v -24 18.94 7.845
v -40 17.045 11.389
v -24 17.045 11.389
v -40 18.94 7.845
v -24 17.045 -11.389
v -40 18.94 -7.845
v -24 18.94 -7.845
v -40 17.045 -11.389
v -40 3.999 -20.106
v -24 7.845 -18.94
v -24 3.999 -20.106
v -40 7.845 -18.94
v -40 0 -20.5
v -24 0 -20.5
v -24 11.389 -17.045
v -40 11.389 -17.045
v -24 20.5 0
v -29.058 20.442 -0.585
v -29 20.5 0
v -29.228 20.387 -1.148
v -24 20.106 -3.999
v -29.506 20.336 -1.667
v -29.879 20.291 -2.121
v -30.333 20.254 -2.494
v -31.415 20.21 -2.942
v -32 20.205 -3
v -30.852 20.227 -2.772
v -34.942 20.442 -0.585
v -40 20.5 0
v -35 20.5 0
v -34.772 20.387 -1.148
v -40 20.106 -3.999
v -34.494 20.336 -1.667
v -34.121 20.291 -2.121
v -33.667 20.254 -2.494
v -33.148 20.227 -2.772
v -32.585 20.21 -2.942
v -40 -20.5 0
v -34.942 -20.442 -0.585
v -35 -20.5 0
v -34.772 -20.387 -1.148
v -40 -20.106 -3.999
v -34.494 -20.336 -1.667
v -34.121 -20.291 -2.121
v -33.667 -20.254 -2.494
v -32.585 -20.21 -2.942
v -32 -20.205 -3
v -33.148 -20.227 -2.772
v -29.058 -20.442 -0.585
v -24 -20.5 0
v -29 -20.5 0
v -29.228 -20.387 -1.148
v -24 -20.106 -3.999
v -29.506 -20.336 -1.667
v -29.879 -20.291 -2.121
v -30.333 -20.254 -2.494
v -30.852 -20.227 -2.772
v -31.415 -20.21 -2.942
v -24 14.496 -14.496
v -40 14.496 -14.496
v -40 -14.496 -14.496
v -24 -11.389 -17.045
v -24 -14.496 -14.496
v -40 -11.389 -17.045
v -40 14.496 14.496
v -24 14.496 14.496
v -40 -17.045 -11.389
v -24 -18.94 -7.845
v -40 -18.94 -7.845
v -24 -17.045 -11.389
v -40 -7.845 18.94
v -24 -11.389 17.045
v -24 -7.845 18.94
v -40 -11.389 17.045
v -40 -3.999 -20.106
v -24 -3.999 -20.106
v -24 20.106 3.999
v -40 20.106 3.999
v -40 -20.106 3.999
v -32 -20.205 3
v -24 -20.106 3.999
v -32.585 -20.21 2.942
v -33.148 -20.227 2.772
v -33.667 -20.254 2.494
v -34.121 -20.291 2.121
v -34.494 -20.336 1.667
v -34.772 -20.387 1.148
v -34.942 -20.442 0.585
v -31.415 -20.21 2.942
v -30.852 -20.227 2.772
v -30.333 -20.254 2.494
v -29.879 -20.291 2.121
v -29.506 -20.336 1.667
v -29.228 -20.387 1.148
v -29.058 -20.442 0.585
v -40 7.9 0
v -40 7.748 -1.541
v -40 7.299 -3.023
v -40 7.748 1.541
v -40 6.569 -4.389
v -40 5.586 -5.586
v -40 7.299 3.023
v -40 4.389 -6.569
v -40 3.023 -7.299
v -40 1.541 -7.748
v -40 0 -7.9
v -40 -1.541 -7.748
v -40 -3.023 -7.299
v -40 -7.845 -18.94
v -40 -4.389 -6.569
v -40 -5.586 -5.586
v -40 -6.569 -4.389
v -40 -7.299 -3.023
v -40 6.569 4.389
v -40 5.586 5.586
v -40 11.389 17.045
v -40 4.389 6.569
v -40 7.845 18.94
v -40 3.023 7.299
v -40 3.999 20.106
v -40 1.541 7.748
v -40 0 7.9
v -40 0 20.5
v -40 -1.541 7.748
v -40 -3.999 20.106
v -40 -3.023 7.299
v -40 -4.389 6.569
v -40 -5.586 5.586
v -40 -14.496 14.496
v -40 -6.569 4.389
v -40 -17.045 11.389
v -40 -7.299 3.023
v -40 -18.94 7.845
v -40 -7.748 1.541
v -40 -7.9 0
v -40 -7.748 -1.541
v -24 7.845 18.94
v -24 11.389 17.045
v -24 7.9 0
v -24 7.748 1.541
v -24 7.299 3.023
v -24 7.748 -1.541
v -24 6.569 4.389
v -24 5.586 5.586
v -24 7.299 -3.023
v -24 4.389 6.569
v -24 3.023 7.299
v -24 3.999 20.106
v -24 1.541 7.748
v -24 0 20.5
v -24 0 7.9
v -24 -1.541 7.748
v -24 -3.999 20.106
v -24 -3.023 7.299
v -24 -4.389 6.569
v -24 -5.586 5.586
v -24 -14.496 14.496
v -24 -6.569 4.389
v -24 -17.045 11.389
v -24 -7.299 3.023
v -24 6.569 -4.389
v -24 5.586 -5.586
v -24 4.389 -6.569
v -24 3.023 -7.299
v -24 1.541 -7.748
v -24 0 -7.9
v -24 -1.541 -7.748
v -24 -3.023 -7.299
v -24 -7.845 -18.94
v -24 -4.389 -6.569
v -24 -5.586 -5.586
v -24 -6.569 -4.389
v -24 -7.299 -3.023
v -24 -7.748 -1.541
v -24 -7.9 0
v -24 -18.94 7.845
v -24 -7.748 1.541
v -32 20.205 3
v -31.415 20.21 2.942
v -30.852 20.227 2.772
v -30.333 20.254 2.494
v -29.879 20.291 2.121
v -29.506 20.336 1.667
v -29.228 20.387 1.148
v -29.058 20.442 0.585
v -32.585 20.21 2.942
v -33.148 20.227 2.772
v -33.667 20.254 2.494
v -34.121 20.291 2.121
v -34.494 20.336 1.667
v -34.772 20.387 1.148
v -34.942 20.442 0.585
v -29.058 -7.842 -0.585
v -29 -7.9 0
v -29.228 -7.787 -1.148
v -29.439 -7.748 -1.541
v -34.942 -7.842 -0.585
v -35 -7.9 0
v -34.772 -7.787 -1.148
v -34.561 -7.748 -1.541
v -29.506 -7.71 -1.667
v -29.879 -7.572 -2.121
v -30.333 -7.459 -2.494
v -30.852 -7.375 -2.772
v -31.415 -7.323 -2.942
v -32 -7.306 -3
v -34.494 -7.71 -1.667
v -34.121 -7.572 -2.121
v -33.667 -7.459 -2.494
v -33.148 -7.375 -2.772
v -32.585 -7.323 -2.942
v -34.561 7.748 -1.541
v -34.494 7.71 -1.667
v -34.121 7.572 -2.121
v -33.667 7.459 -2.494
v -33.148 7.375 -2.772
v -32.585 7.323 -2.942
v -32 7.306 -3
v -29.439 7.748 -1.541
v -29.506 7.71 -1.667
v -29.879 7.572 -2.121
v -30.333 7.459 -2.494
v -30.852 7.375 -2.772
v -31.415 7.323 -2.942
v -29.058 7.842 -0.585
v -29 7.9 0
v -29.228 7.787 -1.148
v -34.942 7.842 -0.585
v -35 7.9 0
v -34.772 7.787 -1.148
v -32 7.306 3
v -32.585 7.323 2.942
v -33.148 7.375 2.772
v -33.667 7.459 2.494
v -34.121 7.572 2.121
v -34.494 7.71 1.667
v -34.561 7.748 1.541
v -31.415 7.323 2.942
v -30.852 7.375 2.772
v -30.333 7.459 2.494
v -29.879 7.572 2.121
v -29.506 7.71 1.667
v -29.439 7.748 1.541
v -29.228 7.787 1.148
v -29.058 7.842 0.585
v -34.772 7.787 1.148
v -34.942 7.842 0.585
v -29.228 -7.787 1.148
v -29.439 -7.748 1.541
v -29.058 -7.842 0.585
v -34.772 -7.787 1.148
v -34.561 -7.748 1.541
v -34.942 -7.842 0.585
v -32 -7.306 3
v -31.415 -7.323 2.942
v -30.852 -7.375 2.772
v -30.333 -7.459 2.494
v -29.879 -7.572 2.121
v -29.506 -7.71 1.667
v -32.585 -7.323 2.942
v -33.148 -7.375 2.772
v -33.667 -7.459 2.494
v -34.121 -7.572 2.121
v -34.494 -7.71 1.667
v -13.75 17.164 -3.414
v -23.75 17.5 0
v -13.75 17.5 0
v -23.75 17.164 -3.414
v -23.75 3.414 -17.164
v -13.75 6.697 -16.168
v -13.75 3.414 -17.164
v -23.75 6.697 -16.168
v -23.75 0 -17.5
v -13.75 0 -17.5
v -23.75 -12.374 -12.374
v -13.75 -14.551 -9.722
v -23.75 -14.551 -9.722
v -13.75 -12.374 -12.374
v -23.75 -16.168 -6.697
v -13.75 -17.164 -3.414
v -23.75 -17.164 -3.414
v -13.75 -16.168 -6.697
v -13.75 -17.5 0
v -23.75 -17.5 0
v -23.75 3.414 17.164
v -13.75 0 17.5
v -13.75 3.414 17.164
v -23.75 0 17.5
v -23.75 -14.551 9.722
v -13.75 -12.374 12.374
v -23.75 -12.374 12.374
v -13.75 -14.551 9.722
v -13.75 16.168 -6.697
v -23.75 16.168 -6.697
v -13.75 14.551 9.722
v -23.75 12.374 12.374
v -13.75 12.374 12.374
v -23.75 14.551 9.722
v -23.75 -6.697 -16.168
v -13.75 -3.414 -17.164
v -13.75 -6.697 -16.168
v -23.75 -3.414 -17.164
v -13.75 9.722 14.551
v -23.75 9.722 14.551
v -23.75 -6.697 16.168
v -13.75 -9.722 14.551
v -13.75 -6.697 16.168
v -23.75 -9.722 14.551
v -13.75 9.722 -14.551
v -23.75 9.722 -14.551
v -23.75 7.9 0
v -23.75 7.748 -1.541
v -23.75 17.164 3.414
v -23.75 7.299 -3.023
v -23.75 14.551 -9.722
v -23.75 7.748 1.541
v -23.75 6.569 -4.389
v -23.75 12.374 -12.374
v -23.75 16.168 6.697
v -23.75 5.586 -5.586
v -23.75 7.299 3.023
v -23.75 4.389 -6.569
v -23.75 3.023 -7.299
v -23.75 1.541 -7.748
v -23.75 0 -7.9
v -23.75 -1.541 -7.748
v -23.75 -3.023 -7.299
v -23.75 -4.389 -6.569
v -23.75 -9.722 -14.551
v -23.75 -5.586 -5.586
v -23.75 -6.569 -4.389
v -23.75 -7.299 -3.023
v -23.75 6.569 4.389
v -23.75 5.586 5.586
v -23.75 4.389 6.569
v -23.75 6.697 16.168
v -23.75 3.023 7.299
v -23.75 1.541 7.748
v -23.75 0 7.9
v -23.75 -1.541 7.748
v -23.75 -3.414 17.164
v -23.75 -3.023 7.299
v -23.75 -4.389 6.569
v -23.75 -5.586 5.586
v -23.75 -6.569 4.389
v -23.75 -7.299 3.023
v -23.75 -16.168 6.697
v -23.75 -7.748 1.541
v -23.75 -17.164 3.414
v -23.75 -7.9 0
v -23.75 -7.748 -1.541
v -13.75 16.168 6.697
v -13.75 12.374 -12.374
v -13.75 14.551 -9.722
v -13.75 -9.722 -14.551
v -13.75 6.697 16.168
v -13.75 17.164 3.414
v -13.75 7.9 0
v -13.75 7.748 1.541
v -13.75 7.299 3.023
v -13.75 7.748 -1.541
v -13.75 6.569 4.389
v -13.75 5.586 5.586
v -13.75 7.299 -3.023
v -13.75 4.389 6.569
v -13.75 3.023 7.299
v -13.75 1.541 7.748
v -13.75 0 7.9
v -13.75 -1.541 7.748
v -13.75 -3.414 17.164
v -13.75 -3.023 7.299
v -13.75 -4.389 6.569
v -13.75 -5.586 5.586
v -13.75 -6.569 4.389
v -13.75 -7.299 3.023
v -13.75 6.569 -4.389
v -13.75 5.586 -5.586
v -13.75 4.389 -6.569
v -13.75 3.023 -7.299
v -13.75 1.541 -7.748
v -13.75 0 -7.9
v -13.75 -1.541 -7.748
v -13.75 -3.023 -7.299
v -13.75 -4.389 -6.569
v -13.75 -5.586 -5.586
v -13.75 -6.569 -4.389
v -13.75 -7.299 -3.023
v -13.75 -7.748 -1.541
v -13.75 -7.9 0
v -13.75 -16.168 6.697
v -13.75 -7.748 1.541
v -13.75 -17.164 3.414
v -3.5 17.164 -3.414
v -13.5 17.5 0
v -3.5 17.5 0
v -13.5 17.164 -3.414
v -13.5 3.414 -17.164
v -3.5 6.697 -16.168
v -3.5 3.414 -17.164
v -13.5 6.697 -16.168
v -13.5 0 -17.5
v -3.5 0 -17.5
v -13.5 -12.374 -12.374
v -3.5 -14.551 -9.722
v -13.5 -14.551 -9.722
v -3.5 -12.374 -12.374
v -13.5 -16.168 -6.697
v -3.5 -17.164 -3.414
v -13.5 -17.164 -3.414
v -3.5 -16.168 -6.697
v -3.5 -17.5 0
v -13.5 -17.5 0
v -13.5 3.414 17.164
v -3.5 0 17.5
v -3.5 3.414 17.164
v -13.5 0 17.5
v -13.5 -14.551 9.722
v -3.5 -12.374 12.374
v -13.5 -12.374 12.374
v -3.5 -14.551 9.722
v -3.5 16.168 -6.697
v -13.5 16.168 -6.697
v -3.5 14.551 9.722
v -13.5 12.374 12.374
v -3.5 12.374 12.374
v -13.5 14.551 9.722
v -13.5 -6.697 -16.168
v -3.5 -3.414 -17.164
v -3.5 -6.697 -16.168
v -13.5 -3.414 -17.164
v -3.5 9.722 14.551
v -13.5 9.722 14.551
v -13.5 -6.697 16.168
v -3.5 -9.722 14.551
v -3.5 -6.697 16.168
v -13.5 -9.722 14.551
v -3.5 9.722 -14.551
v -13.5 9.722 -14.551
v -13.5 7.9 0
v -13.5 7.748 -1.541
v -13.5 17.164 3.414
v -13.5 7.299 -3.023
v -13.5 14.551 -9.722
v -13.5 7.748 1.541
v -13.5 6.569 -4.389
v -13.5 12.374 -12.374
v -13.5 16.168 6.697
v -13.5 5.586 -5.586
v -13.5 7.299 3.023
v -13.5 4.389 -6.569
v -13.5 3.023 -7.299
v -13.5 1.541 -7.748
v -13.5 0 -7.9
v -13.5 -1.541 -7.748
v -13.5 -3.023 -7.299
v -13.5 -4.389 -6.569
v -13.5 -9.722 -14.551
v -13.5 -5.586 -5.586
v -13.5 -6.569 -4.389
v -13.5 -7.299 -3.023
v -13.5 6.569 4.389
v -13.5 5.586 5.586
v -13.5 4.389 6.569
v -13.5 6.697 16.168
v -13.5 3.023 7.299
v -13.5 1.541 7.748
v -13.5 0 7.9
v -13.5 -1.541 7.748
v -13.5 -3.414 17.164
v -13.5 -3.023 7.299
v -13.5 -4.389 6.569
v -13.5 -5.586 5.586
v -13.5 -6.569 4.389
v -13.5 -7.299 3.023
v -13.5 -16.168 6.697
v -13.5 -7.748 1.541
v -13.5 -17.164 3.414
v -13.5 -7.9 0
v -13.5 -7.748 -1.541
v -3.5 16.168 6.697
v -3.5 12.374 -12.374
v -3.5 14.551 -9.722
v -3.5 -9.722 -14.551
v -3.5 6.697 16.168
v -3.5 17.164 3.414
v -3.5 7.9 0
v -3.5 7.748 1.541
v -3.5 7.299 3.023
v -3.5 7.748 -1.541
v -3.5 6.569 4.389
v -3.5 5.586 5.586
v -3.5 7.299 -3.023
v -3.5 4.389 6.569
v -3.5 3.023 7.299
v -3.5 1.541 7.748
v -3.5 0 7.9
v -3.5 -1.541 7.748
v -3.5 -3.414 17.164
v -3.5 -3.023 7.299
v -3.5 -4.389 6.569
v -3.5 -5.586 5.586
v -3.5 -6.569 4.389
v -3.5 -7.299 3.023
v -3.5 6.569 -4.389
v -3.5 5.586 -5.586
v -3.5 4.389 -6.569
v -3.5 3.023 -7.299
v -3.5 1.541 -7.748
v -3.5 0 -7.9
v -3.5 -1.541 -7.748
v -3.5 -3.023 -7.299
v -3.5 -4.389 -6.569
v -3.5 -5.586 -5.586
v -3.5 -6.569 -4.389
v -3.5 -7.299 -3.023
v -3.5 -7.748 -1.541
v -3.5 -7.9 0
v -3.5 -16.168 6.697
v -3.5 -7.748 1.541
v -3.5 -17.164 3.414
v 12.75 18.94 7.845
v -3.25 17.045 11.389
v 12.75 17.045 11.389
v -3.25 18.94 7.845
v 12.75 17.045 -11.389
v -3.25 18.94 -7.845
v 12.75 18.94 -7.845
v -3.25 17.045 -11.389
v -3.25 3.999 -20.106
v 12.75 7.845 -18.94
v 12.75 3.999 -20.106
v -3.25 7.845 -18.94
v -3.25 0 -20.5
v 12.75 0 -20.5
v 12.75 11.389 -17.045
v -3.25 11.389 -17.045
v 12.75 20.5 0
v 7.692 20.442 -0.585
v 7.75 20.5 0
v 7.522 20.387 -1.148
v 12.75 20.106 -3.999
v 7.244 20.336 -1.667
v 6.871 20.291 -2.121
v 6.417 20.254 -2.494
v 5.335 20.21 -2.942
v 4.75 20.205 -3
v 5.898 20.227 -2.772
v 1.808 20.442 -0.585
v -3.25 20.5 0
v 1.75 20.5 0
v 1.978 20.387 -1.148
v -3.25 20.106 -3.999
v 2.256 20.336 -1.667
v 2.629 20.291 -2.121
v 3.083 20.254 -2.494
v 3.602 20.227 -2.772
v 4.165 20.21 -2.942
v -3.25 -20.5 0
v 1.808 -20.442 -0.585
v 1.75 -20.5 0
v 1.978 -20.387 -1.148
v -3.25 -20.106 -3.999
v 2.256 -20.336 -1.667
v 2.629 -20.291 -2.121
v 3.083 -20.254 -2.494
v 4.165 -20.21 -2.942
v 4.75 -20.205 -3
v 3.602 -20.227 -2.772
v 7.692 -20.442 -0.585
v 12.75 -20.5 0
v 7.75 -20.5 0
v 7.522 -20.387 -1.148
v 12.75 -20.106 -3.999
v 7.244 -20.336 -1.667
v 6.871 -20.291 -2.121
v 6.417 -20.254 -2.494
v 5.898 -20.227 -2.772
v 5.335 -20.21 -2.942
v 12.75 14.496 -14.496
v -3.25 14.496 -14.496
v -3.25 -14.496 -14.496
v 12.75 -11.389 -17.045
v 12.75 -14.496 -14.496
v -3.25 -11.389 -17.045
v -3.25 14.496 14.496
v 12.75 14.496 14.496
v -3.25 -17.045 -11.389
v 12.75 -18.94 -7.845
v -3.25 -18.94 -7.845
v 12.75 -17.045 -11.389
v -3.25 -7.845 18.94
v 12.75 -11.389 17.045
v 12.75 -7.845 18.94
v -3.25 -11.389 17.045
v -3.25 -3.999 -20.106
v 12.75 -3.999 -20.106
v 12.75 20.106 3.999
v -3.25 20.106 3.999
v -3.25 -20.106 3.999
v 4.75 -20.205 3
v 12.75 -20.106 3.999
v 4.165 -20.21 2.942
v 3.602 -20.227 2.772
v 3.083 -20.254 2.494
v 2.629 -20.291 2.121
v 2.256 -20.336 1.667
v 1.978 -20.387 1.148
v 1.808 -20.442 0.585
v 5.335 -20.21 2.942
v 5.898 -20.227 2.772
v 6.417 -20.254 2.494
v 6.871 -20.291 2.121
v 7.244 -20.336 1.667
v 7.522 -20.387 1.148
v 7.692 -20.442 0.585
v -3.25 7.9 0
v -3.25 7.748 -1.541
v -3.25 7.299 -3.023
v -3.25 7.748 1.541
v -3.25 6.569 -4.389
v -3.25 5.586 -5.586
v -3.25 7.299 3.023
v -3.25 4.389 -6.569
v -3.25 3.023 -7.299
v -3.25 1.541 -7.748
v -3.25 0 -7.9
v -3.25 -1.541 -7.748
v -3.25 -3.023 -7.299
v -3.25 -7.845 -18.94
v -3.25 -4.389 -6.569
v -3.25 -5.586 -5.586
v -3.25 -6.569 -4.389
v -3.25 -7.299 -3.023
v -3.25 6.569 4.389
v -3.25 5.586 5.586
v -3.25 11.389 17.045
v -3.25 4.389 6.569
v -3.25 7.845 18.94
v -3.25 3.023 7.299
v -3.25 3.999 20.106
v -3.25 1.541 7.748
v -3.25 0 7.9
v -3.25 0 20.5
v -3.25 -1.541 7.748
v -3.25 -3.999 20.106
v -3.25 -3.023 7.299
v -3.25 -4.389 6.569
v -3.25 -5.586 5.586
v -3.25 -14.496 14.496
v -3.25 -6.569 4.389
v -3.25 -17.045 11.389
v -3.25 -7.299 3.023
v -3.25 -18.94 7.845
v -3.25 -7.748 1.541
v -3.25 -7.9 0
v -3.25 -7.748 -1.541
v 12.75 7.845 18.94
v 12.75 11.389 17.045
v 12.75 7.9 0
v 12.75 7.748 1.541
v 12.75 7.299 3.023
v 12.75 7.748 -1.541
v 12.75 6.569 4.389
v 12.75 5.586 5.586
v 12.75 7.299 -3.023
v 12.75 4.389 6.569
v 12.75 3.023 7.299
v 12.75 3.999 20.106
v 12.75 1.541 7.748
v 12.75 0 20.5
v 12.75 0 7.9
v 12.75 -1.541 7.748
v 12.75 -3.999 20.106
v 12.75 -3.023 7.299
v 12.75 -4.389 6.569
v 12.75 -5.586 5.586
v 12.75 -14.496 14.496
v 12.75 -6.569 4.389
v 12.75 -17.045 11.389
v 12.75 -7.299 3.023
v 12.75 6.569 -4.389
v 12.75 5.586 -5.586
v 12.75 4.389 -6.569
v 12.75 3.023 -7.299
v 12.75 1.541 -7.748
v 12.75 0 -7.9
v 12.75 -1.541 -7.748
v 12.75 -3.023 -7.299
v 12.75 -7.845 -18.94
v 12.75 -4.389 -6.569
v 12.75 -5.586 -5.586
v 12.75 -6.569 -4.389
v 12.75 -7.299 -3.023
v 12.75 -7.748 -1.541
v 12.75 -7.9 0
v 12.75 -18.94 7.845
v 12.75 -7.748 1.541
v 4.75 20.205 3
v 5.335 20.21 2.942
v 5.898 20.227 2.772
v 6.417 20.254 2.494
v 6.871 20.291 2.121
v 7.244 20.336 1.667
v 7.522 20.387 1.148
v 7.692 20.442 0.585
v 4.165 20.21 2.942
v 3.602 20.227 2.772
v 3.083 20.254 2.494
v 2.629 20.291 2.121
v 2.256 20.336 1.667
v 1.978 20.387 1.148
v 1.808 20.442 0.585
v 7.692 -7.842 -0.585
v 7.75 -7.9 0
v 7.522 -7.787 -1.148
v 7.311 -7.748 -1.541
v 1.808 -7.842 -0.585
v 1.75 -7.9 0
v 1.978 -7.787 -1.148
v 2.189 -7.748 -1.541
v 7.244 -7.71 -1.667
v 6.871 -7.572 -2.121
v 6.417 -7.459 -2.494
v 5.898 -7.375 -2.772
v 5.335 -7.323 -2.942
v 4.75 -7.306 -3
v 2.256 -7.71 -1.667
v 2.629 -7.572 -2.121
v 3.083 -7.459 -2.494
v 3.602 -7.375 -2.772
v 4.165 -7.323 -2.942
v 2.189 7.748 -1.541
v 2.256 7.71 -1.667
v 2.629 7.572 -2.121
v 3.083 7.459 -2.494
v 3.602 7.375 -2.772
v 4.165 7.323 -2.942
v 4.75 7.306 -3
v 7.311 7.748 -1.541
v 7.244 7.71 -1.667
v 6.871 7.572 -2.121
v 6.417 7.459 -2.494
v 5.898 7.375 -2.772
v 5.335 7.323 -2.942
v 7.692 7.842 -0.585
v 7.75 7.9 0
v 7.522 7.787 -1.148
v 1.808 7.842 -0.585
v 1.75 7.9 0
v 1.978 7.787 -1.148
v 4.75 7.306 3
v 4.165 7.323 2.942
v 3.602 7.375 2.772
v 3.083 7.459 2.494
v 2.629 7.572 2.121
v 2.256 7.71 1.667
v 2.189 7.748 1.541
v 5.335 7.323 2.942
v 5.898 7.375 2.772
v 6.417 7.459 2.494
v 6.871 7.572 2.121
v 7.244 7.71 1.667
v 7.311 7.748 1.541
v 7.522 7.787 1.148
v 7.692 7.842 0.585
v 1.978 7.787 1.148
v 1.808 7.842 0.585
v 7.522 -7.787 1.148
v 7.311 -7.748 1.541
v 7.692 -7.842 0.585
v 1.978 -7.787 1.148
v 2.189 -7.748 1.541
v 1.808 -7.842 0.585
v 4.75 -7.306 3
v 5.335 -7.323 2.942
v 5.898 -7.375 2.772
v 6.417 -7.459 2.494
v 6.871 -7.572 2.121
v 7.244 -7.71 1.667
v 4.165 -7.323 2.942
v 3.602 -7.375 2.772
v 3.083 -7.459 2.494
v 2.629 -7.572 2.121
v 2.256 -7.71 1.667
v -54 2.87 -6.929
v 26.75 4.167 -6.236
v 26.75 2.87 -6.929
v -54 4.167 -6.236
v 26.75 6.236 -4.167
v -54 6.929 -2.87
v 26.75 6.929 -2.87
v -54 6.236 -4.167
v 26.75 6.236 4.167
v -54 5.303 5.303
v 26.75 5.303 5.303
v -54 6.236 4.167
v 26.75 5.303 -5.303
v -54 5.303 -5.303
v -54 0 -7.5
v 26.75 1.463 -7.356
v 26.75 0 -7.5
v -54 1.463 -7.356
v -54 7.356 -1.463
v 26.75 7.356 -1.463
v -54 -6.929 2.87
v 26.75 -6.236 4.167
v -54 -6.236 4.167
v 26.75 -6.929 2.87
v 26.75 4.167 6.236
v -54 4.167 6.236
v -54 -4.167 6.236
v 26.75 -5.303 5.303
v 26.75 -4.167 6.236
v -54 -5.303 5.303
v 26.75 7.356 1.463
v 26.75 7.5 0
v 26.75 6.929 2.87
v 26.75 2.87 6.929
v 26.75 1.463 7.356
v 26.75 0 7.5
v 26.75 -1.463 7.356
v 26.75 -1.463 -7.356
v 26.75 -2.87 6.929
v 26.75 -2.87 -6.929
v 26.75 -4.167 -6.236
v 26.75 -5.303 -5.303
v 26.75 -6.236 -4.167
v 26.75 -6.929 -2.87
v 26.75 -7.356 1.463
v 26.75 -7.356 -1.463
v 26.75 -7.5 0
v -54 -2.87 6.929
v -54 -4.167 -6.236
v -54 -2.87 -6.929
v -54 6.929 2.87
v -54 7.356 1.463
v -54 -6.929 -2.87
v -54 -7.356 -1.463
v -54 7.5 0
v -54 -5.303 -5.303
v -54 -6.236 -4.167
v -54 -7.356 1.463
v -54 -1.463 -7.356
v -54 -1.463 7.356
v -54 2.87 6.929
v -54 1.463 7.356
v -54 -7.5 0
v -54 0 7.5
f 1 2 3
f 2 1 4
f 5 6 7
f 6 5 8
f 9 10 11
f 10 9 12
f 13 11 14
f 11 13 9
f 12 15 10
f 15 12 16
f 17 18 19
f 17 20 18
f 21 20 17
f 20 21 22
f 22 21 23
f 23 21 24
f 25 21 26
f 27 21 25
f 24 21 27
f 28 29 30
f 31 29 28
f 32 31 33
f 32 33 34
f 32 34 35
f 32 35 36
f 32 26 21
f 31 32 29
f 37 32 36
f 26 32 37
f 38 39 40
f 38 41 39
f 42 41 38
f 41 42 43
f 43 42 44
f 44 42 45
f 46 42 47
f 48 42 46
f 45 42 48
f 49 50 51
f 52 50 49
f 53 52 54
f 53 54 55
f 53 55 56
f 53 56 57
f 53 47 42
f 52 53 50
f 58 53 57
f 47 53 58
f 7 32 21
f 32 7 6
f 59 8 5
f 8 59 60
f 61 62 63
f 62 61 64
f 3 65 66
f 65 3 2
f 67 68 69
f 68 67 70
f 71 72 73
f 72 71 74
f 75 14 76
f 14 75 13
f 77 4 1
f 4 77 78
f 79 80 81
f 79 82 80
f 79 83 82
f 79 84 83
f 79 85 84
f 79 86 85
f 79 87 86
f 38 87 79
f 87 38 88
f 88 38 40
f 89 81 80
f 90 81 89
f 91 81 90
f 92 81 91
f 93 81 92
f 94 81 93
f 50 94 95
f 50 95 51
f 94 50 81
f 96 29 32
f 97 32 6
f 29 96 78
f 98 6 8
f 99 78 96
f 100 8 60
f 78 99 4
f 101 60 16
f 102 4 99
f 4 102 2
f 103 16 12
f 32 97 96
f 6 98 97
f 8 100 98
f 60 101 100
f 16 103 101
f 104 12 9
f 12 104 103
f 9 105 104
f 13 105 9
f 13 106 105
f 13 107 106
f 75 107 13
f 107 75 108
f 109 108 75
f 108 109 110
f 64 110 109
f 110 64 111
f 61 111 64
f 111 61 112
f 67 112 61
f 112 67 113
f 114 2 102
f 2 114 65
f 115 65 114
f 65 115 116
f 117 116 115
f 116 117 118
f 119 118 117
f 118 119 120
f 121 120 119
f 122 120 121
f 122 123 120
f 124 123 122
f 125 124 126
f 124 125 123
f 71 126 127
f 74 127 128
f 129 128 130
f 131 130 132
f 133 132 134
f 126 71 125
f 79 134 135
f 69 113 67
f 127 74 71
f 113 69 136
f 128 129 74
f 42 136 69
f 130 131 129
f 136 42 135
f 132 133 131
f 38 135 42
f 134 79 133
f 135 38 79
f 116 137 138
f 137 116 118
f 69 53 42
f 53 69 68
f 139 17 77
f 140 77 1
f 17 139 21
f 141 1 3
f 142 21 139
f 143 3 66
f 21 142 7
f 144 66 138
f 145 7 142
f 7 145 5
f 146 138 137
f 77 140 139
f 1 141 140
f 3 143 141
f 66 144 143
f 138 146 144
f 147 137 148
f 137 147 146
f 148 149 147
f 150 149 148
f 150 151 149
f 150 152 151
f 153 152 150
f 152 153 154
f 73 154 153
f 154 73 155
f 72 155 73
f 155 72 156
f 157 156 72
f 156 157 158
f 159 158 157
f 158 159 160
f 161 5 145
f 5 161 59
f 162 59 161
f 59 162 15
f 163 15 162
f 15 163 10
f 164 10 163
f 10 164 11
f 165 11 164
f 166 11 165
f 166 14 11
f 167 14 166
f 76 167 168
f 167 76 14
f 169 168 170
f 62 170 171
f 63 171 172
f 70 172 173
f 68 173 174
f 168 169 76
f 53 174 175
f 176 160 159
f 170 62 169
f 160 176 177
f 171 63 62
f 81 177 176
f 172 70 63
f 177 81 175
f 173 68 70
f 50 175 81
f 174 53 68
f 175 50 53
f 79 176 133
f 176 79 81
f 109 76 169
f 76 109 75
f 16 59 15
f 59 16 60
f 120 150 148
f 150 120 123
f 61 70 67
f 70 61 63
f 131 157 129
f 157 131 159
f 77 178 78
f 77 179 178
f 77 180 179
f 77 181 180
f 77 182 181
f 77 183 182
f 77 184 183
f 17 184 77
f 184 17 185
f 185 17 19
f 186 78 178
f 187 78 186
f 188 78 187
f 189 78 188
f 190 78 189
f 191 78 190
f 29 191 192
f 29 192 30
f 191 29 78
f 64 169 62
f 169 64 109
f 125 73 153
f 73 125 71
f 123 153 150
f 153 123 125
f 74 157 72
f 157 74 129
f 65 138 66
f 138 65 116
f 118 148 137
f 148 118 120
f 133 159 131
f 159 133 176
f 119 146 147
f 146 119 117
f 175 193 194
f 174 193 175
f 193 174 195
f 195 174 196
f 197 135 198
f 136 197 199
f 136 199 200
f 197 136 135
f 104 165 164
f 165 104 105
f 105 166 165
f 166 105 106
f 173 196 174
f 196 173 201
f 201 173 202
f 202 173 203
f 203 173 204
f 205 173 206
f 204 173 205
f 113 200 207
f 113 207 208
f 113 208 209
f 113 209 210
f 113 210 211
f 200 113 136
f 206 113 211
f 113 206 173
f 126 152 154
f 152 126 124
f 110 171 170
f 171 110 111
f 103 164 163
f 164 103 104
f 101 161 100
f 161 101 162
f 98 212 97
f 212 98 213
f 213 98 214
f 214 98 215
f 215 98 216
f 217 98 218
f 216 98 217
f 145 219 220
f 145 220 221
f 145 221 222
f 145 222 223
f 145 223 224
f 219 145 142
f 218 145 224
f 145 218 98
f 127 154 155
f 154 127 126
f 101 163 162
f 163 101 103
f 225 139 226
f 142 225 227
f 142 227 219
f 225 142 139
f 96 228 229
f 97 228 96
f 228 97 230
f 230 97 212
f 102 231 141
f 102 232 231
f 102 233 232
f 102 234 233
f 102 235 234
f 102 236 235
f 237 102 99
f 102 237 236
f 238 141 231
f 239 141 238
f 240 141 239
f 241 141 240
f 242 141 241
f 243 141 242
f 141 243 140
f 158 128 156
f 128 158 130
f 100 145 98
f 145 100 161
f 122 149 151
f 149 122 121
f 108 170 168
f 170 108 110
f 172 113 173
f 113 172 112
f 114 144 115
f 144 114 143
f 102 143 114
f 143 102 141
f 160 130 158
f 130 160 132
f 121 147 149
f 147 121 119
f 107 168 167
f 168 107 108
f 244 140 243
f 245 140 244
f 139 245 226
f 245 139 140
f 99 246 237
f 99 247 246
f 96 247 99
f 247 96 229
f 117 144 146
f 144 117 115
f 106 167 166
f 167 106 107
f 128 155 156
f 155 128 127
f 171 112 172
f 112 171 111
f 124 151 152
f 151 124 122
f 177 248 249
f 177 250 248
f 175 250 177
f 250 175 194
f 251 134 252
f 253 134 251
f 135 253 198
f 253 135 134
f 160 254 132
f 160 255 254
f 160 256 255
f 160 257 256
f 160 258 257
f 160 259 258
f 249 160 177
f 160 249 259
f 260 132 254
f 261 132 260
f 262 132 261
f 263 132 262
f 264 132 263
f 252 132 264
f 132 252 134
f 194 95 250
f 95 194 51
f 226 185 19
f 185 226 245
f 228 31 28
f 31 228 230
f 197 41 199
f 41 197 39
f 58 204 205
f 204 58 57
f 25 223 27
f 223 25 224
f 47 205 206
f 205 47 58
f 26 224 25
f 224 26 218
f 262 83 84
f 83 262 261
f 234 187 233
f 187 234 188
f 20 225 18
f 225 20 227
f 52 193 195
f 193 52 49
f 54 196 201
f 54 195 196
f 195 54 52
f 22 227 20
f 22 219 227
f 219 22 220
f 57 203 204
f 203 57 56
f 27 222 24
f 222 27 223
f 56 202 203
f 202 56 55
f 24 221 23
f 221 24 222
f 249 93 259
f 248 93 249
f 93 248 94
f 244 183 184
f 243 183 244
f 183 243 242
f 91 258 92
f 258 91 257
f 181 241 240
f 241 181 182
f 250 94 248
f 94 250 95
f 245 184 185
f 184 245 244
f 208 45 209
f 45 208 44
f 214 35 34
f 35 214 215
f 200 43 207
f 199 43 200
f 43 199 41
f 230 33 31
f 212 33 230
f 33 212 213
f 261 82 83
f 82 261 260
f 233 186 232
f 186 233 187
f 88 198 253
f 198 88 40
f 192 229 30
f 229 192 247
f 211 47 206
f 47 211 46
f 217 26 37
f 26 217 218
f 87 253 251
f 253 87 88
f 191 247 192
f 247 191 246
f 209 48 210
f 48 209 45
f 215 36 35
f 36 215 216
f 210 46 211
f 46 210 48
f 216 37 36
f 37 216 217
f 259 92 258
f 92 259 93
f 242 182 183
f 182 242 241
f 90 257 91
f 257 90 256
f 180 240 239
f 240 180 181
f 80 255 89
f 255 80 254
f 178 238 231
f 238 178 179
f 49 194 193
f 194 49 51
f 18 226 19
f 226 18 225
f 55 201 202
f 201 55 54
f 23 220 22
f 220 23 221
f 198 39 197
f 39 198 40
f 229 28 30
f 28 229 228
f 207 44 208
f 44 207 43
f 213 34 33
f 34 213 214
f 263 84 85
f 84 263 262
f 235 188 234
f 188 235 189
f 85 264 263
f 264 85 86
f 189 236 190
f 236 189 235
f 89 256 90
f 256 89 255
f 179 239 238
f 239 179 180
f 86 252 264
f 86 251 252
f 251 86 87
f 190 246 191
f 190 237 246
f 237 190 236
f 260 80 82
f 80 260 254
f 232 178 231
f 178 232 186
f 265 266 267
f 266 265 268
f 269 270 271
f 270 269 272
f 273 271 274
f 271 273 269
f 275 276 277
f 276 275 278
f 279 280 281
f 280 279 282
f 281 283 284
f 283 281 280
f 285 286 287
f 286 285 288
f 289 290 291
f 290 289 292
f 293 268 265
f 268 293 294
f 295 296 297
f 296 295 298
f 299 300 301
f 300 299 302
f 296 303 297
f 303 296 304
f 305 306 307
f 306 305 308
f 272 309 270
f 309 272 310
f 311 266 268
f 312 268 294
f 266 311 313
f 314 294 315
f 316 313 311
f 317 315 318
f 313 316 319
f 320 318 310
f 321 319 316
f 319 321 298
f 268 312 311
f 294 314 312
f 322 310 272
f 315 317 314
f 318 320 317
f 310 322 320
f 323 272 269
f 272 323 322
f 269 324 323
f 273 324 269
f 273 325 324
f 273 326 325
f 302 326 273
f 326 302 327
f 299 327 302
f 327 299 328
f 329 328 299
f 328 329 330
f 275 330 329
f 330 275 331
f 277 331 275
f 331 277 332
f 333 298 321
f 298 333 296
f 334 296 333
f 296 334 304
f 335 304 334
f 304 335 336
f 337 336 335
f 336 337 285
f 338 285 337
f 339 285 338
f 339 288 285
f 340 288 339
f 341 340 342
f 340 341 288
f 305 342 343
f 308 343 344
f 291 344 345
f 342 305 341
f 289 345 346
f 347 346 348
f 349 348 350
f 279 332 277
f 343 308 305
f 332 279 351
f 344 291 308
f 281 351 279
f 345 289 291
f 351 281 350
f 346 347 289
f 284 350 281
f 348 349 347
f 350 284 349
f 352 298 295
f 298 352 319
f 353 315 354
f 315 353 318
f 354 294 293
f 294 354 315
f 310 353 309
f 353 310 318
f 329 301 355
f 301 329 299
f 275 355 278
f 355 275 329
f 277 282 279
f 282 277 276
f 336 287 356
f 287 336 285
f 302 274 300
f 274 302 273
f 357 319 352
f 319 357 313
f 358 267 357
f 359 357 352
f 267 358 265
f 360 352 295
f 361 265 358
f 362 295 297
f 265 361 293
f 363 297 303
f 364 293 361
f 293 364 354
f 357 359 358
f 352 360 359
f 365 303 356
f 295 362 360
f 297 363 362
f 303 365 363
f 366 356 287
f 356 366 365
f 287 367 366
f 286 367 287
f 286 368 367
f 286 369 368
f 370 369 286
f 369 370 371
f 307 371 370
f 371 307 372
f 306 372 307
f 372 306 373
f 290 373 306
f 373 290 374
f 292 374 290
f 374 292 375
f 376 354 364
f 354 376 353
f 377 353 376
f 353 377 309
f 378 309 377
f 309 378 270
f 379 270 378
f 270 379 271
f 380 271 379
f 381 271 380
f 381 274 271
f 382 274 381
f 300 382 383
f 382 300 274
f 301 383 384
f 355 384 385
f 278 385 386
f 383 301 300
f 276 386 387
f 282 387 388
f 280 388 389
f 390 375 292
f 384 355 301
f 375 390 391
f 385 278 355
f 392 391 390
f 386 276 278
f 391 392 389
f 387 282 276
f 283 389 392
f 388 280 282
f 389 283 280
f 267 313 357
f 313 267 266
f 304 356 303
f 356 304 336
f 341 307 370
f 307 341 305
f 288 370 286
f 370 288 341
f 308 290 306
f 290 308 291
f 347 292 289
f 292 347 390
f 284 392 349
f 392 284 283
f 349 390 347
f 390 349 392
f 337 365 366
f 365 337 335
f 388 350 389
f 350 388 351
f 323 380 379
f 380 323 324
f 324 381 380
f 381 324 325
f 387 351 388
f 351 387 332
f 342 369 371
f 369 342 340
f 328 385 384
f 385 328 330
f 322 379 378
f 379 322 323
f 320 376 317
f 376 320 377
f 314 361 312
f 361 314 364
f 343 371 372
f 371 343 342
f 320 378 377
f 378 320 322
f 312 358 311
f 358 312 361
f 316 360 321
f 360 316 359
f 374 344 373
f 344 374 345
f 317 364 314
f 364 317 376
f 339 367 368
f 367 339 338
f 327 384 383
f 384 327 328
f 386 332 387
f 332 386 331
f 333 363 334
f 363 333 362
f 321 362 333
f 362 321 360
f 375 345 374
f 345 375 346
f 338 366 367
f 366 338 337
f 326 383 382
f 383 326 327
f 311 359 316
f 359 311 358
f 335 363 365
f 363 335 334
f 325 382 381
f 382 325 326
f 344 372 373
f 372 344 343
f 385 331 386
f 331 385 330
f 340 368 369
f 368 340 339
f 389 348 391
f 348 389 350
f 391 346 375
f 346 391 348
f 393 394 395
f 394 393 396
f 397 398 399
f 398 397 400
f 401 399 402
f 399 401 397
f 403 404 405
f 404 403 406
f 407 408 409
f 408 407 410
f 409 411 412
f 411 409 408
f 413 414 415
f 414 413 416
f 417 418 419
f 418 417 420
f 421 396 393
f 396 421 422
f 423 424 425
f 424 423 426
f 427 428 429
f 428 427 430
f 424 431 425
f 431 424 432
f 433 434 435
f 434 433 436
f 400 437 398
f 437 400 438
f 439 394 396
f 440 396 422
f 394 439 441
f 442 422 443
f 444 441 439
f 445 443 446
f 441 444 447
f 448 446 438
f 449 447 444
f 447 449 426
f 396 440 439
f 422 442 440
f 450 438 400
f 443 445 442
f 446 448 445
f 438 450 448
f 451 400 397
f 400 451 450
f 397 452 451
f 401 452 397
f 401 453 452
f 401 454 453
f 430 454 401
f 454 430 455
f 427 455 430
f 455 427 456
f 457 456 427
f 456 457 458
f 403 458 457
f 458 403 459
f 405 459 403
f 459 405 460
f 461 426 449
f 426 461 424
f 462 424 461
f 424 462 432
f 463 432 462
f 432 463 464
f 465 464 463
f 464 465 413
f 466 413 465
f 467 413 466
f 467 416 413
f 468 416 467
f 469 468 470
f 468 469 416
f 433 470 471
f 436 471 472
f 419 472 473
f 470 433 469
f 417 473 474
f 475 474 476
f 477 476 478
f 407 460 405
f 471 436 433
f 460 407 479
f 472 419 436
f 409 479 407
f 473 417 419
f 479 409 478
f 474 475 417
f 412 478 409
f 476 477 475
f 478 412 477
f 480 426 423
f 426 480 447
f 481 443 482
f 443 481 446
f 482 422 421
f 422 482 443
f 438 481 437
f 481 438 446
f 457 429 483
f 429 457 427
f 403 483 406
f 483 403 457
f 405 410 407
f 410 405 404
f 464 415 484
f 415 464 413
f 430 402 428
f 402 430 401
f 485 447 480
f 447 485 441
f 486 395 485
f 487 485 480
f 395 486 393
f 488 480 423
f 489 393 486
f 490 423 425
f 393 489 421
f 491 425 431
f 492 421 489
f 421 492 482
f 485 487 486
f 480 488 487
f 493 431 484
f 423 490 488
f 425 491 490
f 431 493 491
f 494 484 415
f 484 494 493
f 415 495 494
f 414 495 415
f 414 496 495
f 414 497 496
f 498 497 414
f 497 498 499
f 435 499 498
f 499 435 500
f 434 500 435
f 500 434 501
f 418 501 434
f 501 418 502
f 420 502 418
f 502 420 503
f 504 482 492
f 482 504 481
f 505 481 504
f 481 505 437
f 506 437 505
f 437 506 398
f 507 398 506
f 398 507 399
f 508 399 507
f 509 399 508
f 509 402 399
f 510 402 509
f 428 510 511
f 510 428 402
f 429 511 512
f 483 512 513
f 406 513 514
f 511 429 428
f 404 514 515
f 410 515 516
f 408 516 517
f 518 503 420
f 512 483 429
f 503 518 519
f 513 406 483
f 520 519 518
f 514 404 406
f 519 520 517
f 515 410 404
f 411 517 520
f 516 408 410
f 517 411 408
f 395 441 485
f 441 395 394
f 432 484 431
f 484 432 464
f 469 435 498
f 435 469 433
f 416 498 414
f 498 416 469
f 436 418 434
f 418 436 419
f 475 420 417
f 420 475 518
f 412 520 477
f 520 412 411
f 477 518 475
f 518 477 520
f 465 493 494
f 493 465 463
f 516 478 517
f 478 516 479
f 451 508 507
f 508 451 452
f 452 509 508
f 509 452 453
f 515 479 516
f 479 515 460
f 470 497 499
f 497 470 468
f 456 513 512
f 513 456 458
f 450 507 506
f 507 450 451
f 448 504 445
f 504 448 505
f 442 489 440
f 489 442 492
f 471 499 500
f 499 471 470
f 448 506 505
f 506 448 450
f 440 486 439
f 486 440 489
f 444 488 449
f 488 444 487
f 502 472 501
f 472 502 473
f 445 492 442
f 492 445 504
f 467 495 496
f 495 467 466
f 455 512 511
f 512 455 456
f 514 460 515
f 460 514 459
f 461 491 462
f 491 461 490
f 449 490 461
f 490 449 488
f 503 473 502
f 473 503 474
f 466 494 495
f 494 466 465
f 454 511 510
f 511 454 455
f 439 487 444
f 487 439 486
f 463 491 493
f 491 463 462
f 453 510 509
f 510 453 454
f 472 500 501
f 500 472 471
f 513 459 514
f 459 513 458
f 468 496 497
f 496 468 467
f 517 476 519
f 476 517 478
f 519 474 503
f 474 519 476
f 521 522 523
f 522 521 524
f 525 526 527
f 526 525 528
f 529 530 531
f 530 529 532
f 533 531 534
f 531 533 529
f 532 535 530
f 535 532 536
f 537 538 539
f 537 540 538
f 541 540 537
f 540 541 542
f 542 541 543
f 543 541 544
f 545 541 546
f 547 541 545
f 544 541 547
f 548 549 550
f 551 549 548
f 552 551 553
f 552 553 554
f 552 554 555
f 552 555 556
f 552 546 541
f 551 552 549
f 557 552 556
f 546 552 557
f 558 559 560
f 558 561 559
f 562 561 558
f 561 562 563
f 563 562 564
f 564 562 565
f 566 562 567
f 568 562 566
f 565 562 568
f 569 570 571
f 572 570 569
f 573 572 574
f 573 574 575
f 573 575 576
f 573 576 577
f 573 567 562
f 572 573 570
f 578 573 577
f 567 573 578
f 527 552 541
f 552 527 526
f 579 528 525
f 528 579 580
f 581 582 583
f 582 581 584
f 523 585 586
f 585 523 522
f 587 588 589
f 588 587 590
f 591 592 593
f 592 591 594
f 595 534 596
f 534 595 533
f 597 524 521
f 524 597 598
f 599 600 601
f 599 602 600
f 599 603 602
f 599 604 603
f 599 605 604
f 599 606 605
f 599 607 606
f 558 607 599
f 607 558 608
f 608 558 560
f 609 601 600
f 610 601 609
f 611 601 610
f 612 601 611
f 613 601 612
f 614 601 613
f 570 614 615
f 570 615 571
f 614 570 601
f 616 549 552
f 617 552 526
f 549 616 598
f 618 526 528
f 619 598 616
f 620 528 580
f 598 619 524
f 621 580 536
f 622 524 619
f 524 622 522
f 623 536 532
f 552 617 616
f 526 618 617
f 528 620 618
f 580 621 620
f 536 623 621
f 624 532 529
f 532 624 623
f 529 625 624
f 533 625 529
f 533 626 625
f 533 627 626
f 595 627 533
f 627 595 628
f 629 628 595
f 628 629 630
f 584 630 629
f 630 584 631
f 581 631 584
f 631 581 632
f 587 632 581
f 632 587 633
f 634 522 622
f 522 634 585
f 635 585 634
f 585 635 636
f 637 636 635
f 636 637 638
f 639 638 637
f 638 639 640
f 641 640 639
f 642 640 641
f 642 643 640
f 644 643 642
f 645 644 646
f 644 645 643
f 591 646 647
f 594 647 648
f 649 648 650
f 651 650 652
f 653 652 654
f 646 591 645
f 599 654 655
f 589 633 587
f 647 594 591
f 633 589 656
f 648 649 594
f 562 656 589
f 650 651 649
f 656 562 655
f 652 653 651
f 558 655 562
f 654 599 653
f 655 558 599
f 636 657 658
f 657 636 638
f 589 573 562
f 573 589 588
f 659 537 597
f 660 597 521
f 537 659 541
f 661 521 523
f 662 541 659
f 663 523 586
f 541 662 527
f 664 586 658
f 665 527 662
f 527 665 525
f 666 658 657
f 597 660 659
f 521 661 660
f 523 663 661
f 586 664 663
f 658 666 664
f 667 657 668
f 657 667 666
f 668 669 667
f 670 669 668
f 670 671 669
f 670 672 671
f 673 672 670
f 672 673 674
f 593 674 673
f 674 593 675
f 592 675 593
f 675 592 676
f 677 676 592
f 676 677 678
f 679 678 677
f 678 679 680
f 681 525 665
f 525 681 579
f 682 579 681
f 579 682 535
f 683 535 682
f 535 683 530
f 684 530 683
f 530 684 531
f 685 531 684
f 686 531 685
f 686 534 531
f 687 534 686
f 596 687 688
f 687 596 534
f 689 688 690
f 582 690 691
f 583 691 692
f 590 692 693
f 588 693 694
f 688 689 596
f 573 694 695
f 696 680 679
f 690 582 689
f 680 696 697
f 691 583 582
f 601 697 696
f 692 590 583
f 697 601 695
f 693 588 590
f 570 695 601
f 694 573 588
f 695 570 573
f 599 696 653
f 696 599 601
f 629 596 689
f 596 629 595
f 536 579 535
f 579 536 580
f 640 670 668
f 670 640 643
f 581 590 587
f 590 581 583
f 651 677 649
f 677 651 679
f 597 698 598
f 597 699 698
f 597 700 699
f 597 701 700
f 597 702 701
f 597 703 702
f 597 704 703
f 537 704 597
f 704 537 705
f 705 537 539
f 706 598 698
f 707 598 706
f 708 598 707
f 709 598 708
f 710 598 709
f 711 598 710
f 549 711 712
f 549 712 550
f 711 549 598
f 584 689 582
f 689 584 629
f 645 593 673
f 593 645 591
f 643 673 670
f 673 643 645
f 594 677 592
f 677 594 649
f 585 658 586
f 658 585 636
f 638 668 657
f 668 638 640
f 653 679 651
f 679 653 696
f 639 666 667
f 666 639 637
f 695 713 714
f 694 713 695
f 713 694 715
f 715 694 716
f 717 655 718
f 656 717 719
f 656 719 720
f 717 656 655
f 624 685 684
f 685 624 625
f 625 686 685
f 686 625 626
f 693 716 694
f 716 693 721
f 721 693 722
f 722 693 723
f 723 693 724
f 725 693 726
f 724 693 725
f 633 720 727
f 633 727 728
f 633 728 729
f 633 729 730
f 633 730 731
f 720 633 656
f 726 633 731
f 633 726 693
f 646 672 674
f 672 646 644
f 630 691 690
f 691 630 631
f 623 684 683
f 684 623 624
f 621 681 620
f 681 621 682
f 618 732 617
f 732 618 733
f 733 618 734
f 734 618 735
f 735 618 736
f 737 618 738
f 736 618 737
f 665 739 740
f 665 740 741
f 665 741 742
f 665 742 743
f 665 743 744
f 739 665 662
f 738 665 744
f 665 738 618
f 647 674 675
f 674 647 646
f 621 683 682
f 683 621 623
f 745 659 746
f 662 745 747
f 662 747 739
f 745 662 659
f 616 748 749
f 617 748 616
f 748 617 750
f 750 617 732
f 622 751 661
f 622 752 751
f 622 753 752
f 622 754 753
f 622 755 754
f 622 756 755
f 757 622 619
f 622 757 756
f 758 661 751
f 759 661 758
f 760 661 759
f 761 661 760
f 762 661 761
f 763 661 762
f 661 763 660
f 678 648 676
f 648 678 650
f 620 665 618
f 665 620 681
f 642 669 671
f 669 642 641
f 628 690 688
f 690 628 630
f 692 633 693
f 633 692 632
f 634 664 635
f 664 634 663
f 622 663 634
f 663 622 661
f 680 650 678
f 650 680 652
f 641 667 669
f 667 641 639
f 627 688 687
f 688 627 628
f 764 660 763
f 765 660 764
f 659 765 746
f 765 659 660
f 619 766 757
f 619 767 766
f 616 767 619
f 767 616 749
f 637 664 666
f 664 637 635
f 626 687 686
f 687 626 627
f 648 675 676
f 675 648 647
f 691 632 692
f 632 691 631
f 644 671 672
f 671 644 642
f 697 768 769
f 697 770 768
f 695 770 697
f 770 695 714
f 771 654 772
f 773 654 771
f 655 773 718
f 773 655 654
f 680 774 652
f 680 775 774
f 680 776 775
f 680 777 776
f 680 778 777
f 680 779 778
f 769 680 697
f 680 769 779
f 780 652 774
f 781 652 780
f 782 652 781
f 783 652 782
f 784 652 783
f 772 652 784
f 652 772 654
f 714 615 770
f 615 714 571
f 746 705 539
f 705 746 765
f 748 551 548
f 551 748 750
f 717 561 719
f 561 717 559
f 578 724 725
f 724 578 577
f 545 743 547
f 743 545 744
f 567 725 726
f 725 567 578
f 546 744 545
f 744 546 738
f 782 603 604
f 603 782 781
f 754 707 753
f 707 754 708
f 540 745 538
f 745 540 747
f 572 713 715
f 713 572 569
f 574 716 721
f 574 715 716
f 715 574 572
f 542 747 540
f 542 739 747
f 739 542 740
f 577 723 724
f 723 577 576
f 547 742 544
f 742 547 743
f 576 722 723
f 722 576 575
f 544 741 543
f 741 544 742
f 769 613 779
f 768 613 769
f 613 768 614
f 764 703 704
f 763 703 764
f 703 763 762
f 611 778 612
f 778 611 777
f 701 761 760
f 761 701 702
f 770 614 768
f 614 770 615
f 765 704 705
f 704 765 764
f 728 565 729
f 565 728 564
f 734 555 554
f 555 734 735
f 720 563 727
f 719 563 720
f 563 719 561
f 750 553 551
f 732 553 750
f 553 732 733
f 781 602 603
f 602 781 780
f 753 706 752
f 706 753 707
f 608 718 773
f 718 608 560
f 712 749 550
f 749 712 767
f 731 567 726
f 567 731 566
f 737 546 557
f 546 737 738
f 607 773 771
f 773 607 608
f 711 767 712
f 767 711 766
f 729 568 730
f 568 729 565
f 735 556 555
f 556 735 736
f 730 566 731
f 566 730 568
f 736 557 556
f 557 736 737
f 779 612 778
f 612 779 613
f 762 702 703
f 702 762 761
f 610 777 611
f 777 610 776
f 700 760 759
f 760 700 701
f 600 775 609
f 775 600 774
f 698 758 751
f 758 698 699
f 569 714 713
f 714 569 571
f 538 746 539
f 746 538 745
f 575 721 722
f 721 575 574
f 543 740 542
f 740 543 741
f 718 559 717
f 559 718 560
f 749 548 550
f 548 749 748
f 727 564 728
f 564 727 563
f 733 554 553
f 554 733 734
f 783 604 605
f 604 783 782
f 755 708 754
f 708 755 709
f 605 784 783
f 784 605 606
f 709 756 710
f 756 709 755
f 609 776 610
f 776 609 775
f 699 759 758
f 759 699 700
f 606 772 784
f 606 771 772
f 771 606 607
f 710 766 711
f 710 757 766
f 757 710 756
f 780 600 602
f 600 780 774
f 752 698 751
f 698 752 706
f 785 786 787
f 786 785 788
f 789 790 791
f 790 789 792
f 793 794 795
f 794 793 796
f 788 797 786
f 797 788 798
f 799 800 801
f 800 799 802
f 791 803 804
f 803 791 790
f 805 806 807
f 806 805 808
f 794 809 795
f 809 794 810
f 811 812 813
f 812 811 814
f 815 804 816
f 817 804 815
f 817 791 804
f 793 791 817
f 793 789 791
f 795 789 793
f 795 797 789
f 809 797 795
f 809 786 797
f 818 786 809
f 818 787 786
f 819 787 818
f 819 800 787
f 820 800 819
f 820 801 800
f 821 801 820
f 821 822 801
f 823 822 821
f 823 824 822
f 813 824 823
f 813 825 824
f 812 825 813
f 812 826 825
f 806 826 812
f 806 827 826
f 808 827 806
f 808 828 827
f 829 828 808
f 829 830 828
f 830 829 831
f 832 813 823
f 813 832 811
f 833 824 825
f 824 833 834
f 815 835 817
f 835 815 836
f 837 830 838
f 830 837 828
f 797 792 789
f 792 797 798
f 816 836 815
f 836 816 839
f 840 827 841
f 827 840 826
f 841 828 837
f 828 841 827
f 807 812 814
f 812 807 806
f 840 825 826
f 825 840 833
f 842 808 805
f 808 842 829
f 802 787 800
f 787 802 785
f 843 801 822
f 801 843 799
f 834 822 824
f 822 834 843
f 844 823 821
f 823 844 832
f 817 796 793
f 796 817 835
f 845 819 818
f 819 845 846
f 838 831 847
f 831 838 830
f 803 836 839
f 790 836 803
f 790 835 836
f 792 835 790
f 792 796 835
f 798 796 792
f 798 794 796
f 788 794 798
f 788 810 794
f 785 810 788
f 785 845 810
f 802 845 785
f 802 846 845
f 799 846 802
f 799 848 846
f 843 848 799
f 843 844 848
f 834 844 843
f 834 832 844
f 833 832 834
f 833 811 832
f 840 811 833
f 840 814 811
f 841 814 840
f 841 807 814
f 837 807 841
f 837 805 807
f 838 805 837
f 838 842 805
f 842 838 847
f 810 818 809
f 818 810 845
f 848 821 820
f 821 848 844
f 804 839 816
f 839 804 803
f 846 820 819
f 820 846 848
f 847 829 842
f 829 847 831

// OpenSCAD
$fn = 32;

// ------------------------------------------------------------------------
// Shaft with rings and collars: d15 shaft, 4 rings
// Every part is its own module, assembly() places them once.
// ------------------------------------------------------------------------

// --- part 1 ---
module shaft() {
  translate([0, 0, -40.375]) cylinder(h = 80.75, d = 15);
}

// --- part 2 ---
module collar_a() {
  difference() {
    cylinder(h = 16, d = 41);
    translate([0, 0, -1]) cylinder(h = 18, d = 15.8);
    translate([0, 0, 8]) rotate([90, 0, 0]) cylinder(h = 43, d = 6, center = true);
  }
}

// --- part 3 ---
module spacer_a() {
  difference() {
      translate([0, 0, 0]) cylinder(h = 10, d = 35);
      translate([0, 0, -1]) cylinder(h = 12, d = 15.8);
    }
}

// --- part 4 ---
module spacer_b() {
  difference() {
      translate([0, 0, 0]) cylinder(h = 10, d = 35);
      translate([0, 0, -1]) cylinder(h = 12, d = 15.8);
    }
}

// --- part 5 ---
module collar_b() {
  difference() {
    cylinder(h = 16, d = 41);
    translate([0, 0, -1]) cylinder(h = 18, d = 15.8);
    translate([0, 0, 8]) rotate([90, 0, 0]) cylinder(h = 43, d = 6, center = true);
  }
}

// --- assembly ---
module assembly() {
  translate([-13.625, 0, 0]) rotate([0, 90, 0]) shaft();
  translate([-40, 0, 0]) rotate([0, 90, 0]) collar_a();
  translate([-23.75, 0, 0]) rotate([0, 90, 0]) spacer_a();
  translate([-13.5, 0, 0]) rotate([0, 90, 0]) spacer_b();
  translate([-3.25, 0, 0]) rotate([0, 90, 0]) collar_b();
}

assembly();
